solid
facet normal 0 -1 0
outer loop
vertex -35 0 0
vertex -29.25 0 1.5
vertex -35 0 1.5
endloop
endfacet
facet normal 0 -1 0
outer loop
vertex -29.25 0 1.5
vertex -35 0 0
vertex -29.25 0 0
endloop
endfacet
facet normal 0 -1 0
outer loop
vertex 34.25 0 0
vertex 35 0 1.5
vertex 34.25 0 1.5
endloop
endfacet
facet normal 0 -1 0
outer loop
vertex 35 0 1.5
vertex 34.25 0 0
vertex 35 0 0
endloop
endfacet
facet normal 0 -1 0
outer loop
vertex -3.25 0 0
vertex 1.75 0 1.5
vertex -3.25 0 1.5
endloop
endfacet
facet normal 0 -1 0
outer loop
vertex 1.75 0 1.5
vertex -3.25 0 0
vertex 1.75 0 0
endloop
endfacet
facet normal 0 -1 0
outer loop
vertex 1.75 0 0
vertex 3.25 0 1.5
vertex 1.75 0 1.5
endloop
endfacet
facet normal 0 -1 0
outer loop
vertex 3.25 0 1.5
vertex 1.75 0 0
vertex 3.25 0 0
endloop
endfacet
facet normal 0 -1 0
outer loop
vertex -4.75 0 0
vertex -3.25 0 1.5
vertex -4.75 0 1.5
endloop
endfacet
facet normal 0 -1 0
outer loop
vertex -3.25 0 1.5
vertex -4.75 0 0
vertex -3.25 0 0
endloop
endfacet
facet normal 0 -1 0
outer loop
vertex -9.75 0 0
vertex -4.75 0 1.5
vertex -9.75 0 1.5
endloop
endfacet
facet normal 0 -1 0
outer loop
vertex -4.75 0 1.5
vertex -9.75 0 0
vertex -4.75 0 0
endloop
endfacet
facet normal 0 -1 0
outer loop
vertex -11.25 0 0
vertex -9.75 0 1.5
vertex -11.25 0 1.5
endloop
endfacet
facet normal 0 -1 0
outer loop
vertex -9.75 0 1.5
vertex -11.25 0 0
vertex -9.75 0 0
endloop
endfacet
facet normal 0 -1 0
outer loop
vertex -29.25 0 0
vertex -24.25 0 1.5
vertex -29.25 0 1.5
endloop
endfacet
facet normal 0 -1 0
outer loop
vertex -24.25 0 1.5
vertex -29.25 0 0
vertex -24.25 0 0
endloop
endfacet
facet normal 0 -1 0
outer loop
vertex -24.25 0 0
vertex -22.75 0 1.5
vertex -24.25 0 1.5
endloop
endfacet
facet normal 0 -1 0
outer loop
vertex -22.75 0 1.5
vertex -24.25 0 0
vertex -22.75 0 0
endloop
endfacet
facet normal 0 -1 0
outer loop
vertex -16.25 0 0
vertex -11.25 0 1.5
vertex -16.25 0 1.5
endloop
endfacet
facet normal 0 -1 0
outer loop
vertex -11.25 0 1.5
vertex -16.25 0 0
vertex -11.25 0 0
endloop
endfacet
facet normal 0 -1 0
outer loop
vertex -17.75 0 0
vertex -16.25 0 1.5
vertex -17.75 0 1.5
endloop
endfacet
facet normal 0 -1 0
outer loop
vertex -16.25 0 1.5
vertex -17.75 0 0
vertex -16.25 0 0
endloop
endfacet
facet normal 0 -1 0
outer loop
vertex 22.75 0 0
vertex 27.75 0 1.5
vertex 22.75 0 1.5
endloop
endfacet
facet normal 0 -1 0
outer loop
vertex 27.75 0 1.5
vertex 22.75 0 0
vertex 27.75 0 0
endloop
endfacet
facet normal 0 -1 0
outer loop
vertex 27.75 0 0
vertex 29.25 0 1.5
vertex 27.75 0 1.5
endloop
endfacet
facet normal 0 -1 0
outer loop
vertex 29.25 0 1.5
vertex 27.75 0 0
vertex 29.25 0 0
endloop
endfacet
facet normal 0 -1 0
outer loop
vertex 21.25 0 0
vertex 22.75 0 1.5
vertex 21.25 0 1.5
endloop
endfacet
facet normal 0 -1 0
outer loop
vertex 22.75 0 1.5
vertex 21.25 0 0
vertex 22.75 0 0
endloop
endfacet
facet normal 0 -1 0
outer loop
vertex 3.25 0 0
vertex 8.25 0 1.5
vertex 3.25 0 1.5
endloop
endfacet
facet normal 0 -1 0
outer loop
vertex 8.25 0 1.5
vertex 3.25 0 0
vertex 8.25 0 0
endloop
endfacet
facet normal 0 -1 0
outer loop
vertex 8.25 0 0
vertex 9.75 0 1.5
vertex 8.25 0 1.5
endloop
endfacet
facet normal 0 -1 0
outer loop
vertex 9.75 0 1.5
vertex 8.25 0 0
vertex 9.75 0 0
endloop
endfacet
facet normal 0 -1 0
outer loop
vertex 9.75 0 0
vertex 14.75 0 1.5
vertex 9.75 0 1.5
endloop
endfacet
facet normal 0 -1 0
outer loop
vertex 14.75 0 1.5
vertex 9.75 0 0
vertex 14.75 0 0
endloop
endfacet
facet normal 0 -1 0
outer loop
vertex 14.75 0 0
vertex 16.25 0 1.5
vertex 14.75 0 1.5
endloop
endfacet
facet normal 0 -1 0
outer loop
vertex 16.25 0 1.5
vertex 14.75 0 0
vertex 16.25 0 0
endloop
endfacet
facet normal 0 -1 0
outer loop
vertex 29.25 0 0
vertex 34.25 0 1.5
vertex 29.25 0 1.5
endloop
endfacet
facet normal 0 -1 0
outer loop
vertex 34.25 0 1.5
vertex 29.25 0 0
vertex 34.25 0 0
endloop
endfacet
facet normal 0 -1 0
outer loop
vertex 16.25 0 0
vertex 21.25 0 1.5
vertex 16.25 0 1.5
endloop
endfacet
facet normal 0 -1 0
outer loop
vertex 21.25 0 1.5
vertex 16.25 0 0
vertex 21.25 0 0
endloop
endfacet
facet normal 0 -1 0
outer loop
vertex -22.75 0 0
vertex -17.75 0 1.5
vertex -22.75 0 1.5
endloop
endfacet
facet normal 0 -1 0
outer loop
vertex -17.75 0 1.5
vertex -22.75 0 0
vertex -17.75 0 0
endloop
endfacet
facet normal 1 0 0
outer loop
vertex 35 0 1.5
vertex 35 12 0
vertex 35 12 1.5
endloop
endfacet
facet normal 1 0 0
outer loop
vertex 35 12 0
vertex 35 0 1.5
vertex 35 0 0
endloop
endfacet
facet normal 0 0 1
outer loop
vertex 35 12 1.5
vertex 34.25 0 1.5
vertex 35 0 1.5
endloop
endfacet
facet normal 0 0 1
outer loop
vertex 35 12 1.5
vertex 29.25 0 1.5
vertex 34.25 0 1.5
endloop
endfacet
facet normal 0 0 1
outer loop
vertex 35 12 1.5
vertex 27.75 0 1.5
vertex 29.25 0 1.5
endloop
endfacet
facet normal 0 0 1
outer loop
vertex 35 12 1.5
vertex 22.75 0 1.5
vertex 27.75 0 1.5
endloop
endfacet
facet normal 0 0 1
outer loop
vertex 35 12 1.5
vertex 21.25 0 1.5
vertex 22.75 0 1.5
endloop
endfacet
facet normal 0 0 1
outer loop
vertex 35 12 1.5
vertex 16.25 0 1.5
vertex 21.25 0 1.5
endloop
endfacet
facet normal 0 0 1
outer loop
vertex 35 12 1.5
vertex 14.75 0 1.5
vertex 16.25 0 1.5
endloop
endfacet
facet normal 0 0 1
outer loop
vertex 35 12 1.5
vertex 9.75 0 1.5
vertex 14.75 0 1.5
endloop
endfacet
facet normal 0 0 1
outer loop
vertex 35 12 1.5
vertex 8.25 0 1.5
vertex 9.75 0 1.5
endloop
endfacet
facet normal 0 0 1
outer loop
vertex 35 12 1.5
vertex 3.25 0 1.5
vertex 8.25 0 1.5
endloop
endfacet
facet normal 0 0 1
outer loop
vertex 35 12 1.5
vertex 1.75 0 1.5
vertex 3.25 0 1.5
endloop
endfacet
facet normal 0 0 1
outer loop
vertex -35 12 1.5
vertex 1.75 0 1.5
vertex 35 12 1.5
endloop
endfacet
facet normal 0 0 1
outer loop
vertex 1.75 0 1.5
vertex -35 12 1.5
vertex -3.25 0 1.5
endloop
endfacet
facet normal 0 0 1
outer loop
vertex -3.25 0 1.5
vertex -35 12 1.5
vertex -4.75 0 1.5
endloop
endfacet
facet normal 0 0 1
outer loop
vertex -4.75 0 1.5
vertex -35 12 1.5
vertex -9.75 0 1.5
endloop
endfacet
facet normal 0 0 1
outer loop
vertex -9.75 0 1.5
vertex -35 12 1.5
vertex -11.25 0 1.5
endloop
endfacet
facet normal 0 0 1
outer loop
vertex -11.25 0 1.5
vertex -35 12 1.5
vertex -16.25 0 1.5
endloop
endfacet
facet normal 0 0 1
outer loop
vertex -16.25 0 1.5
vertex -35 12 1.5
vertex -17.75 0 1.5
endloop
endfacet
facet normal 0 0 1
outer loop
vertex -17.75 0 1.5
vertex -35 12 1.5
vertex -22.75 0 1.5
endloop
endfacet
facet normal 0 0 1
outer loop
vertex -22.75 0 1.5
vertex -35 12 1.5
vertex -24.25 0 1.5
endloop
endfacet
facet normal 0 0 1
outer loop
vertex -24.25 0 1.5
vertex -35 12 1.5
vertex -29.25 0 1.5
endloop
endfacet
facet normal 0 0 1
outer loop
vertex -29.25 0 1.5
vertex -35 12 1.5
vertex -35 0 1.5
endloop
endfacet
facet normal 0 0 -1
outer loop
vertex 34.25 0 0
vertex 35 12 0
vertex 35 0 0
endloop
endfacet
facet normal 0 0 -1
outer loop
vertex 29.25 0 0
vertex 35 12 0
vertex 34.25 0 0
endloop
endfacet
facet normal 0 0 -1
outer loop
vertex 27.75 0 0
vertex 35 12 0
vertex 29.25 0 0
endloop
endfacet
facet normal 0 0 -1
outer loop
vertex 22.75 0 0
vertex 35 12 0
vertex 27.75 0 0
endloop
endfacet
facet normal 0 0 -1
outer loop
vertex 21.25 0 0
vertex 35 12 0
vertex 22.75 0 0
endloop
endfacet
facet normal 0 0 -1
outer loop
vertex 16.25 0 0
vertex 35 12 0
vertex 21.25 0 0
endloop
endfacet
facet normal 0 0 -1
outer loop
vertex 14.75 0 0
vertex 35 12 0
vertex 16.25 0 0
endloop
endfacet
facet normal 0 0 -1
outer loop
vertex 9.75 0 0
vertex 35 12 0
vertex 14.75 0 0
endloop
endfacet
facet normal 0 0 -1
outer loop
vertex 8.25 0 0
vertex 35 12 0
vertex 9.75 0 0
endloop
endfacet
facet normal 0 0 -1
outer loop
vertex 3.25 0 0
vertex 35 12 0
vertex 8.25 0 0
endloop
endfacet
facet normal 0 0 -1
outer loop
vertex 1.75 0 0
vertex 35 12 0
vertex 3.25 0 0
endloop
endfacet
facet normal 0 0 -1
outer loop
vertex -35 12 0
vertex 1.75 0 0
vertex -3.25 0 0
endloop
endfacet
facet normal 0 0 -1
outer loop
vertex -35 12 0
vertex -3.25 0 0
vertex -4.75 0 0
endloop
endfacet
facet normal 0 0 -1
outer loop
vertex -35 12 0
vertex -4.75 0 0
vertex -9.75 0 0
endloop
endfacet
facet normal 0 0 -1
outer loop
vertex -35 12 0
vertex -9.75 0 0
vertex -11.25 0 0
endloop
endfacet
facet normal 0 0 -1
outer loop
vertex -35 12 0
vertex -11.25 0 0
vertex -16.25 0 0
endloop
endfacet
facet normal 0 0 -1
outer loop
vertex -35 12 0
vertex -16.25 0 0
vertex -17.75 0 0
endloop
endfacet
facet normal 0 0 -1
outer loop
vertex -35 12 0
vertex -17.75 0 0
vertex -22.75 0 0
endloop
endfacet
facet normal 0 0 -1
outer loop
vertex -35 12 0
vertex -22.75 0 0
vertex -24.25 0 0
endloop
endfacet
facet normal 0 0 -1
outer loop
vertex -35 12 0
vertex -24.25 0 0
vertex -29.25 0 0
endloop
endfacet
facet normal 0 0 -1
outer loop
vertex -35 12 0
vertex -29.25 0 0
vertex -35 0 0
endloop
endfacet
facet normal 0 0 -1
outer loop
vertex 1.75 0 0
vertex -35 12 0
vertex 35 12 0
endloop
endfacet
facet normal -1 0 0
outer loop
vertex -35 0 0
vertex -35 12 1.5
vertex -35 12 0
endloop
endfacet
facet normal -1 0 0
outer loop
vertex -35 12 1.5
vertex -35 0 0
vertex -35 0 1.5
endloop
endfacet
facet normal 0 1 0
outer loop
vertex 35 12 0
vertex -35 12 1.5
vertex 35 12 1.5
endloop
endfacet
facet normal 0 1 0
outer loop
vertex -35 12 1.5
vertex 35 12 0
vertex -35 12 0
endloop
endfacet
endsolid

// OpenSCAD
// 10-well agarose gel comb - printed lying flat
// Units: mm

plate_t      = 1.5;    // plate thickness (Z)
spine_len    = 70;     // spine length (X)
spine_w      = 12;     // spine width (Y)
teeth_n      = 10;     // number of teeth
tooth_w      = 5.0;    // tooth width (X)
tooth_len    = 12;     // tooth length (Y)
tooth_over   = 12;     // tooth extension past spine in -Y
gap          = 1.5;    // gap between teeth (X)
eps          = 0.5;    // cutter overshoot past faces

$fn = 64;

pitch = tooth_w + gap;

difference() {
    // Base plate
    translate([-spine_len/2, 0, 0])
        cube([spine_len, spine_w, plate_t]);

    // Teeth, centred on spine in X
    for (i = [0 : teeth_n - 1])
        translate([(i - (teeth_n - 1)/2) * pitch, -tooth_over, 0])
            cube([tooth_w, tooth_len, plate_t + eps]);
}
